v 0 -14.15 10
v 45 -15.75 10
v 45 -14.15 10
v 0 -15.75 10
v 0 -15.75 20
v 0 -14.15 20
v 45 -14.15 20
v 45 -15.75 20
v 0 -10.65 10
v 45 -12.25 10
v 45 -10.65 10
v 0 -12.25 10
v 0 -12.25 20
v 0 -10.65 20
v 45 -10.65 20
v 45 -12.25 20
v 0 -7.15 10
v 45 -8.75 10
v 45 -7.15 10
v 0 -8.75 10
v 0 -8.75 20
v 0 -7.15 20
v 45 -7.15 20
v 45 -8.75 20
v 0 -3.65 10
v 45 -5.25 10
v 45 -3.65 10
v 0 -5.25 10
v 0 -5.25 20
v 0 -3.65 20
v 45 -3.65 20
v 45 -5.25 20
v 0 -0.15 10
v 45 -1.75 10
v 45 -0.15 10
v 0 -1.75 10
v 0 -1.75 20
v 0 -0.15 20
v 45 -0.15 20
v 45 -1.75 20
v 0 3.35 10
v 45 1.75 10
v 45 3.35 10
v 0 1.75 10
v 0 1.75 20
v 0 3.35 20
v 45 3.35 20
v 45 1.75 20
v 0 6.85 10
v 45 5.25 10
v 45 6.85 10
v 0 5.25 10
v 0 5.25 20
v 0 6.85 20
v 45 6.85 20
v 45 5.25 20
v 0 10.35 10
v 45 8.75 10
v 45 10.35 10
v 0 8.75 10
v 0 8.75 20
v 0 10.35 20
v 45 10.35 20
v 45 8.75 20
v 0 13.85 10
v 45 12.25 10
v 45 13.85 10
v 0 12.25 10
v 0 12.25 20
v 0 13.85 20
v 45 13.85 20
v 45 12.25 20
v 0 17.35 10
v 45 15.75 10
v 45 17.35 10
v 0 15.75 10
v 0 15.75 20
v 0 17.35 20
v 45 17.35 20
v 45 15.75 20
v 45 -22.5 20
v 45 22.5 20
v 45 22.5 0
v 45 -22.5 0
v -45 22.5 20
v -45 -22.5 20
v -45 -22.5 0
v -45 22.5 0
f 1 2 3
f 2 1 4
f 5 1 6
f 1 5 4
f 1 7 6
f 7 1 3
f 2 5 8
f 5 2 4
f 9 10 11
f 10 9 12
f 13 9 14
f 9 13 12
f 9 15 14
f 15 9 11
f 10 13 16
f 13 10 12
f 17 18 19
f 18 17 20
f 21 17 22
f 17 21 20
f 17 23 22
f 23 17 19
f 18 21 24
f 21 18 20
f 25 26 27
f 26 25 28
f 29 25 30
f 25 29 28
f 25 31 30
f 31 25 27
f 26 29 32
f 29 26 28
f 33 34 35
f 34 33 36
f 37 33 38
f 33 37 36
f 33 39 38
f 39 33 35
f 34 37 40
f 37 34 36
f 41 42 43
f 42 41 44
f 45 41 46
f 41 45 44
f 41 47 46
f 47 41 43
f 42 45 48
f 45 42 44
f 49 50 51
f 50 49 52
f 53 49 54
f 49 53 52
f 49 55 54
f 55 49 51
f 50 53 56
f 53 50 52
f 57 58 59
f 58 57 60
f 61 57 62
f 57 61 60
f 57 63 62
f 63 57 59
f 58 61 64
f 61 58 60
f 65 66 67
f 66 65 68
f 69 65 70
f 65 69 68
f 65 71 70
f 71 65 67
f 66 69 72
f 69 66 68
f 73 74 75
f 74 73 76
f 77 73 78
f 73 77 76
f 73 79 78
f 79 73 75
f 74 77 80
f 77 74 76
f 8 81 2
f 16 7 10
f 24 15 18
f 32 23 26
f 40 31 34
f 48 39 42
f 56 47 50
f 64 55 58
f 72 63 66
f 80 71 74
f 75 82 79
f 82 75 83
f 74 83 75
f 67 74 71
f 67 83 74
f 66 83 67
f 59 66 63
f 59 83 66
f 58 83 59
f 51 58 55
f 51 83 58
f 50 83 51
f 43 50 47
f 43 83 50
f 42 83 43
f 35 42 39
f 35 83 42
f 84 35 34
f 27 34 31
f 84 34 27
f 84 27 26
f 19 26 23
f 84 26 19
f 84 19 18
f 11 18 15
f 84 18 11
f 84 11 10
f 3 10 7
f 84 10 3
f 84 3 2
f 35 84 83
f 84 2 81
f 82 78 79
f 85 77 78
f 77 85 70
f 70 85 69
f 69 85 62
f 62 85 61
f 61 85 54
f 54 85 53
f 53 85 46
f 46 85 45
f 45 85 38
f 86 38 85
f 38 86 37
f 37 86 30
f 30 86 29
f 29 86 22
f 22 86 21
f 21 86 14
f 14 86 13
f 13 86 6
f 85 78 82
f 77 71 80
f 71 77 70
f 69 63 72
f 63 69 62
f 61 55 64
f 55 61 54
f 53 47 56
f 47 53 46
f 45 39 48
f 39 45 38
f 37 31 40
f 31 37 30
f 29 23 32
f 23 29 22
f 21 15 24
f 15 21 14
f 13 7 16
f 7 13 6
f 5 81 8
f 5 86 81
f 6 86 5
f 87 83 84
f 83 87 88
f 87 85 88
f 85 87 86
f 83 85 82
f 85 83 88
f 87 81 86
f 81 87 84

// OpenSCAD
// Microscope slide drying rack
// Print orientation: base block on XY plane, slots open upward (+Z)

// ---------- Parameters ----------
base_len    = 90;    // base block length along X (mm)
base_wid    = 45;    // base block width along Y (mm)
base_h      = 20;    // base block height along Z (mm)

slot_count  = 10;    // number of slide slots
slot_len    = 77;    // slot length along X (mm)
slot_w      = 1.6;   // slot width along Y (mm)
slot_depth  = 10;    // slot depth into block from top face (mm)
slot_pitch  = 3.5;   // centre-to-centre slot spacing along Y (mm)

eps         = 0.5;   // overshoot of cutters past the top face (mm)

$fn = 64;

// ---------- Derived ----------
slot_start_y = -(slot_count - 1) * slot_pitch / 2;  // first slot centre Y

// ---------- Model ----------
difference() {
    // Solid base block, centred in X and Y
    translate([-base_len / 2, -base_wid / 2, 0])
        cube([base_len, base_wid, base_h]);

    // Parallel slots running along X, open at the top
    for (i = [0 : slot_count - 1])
        translate([0, slot_start_y + i * slot_pitch, base_h - slot_depth])
            cube([slot_len, slot_w, slot_depth + eps]);
}
